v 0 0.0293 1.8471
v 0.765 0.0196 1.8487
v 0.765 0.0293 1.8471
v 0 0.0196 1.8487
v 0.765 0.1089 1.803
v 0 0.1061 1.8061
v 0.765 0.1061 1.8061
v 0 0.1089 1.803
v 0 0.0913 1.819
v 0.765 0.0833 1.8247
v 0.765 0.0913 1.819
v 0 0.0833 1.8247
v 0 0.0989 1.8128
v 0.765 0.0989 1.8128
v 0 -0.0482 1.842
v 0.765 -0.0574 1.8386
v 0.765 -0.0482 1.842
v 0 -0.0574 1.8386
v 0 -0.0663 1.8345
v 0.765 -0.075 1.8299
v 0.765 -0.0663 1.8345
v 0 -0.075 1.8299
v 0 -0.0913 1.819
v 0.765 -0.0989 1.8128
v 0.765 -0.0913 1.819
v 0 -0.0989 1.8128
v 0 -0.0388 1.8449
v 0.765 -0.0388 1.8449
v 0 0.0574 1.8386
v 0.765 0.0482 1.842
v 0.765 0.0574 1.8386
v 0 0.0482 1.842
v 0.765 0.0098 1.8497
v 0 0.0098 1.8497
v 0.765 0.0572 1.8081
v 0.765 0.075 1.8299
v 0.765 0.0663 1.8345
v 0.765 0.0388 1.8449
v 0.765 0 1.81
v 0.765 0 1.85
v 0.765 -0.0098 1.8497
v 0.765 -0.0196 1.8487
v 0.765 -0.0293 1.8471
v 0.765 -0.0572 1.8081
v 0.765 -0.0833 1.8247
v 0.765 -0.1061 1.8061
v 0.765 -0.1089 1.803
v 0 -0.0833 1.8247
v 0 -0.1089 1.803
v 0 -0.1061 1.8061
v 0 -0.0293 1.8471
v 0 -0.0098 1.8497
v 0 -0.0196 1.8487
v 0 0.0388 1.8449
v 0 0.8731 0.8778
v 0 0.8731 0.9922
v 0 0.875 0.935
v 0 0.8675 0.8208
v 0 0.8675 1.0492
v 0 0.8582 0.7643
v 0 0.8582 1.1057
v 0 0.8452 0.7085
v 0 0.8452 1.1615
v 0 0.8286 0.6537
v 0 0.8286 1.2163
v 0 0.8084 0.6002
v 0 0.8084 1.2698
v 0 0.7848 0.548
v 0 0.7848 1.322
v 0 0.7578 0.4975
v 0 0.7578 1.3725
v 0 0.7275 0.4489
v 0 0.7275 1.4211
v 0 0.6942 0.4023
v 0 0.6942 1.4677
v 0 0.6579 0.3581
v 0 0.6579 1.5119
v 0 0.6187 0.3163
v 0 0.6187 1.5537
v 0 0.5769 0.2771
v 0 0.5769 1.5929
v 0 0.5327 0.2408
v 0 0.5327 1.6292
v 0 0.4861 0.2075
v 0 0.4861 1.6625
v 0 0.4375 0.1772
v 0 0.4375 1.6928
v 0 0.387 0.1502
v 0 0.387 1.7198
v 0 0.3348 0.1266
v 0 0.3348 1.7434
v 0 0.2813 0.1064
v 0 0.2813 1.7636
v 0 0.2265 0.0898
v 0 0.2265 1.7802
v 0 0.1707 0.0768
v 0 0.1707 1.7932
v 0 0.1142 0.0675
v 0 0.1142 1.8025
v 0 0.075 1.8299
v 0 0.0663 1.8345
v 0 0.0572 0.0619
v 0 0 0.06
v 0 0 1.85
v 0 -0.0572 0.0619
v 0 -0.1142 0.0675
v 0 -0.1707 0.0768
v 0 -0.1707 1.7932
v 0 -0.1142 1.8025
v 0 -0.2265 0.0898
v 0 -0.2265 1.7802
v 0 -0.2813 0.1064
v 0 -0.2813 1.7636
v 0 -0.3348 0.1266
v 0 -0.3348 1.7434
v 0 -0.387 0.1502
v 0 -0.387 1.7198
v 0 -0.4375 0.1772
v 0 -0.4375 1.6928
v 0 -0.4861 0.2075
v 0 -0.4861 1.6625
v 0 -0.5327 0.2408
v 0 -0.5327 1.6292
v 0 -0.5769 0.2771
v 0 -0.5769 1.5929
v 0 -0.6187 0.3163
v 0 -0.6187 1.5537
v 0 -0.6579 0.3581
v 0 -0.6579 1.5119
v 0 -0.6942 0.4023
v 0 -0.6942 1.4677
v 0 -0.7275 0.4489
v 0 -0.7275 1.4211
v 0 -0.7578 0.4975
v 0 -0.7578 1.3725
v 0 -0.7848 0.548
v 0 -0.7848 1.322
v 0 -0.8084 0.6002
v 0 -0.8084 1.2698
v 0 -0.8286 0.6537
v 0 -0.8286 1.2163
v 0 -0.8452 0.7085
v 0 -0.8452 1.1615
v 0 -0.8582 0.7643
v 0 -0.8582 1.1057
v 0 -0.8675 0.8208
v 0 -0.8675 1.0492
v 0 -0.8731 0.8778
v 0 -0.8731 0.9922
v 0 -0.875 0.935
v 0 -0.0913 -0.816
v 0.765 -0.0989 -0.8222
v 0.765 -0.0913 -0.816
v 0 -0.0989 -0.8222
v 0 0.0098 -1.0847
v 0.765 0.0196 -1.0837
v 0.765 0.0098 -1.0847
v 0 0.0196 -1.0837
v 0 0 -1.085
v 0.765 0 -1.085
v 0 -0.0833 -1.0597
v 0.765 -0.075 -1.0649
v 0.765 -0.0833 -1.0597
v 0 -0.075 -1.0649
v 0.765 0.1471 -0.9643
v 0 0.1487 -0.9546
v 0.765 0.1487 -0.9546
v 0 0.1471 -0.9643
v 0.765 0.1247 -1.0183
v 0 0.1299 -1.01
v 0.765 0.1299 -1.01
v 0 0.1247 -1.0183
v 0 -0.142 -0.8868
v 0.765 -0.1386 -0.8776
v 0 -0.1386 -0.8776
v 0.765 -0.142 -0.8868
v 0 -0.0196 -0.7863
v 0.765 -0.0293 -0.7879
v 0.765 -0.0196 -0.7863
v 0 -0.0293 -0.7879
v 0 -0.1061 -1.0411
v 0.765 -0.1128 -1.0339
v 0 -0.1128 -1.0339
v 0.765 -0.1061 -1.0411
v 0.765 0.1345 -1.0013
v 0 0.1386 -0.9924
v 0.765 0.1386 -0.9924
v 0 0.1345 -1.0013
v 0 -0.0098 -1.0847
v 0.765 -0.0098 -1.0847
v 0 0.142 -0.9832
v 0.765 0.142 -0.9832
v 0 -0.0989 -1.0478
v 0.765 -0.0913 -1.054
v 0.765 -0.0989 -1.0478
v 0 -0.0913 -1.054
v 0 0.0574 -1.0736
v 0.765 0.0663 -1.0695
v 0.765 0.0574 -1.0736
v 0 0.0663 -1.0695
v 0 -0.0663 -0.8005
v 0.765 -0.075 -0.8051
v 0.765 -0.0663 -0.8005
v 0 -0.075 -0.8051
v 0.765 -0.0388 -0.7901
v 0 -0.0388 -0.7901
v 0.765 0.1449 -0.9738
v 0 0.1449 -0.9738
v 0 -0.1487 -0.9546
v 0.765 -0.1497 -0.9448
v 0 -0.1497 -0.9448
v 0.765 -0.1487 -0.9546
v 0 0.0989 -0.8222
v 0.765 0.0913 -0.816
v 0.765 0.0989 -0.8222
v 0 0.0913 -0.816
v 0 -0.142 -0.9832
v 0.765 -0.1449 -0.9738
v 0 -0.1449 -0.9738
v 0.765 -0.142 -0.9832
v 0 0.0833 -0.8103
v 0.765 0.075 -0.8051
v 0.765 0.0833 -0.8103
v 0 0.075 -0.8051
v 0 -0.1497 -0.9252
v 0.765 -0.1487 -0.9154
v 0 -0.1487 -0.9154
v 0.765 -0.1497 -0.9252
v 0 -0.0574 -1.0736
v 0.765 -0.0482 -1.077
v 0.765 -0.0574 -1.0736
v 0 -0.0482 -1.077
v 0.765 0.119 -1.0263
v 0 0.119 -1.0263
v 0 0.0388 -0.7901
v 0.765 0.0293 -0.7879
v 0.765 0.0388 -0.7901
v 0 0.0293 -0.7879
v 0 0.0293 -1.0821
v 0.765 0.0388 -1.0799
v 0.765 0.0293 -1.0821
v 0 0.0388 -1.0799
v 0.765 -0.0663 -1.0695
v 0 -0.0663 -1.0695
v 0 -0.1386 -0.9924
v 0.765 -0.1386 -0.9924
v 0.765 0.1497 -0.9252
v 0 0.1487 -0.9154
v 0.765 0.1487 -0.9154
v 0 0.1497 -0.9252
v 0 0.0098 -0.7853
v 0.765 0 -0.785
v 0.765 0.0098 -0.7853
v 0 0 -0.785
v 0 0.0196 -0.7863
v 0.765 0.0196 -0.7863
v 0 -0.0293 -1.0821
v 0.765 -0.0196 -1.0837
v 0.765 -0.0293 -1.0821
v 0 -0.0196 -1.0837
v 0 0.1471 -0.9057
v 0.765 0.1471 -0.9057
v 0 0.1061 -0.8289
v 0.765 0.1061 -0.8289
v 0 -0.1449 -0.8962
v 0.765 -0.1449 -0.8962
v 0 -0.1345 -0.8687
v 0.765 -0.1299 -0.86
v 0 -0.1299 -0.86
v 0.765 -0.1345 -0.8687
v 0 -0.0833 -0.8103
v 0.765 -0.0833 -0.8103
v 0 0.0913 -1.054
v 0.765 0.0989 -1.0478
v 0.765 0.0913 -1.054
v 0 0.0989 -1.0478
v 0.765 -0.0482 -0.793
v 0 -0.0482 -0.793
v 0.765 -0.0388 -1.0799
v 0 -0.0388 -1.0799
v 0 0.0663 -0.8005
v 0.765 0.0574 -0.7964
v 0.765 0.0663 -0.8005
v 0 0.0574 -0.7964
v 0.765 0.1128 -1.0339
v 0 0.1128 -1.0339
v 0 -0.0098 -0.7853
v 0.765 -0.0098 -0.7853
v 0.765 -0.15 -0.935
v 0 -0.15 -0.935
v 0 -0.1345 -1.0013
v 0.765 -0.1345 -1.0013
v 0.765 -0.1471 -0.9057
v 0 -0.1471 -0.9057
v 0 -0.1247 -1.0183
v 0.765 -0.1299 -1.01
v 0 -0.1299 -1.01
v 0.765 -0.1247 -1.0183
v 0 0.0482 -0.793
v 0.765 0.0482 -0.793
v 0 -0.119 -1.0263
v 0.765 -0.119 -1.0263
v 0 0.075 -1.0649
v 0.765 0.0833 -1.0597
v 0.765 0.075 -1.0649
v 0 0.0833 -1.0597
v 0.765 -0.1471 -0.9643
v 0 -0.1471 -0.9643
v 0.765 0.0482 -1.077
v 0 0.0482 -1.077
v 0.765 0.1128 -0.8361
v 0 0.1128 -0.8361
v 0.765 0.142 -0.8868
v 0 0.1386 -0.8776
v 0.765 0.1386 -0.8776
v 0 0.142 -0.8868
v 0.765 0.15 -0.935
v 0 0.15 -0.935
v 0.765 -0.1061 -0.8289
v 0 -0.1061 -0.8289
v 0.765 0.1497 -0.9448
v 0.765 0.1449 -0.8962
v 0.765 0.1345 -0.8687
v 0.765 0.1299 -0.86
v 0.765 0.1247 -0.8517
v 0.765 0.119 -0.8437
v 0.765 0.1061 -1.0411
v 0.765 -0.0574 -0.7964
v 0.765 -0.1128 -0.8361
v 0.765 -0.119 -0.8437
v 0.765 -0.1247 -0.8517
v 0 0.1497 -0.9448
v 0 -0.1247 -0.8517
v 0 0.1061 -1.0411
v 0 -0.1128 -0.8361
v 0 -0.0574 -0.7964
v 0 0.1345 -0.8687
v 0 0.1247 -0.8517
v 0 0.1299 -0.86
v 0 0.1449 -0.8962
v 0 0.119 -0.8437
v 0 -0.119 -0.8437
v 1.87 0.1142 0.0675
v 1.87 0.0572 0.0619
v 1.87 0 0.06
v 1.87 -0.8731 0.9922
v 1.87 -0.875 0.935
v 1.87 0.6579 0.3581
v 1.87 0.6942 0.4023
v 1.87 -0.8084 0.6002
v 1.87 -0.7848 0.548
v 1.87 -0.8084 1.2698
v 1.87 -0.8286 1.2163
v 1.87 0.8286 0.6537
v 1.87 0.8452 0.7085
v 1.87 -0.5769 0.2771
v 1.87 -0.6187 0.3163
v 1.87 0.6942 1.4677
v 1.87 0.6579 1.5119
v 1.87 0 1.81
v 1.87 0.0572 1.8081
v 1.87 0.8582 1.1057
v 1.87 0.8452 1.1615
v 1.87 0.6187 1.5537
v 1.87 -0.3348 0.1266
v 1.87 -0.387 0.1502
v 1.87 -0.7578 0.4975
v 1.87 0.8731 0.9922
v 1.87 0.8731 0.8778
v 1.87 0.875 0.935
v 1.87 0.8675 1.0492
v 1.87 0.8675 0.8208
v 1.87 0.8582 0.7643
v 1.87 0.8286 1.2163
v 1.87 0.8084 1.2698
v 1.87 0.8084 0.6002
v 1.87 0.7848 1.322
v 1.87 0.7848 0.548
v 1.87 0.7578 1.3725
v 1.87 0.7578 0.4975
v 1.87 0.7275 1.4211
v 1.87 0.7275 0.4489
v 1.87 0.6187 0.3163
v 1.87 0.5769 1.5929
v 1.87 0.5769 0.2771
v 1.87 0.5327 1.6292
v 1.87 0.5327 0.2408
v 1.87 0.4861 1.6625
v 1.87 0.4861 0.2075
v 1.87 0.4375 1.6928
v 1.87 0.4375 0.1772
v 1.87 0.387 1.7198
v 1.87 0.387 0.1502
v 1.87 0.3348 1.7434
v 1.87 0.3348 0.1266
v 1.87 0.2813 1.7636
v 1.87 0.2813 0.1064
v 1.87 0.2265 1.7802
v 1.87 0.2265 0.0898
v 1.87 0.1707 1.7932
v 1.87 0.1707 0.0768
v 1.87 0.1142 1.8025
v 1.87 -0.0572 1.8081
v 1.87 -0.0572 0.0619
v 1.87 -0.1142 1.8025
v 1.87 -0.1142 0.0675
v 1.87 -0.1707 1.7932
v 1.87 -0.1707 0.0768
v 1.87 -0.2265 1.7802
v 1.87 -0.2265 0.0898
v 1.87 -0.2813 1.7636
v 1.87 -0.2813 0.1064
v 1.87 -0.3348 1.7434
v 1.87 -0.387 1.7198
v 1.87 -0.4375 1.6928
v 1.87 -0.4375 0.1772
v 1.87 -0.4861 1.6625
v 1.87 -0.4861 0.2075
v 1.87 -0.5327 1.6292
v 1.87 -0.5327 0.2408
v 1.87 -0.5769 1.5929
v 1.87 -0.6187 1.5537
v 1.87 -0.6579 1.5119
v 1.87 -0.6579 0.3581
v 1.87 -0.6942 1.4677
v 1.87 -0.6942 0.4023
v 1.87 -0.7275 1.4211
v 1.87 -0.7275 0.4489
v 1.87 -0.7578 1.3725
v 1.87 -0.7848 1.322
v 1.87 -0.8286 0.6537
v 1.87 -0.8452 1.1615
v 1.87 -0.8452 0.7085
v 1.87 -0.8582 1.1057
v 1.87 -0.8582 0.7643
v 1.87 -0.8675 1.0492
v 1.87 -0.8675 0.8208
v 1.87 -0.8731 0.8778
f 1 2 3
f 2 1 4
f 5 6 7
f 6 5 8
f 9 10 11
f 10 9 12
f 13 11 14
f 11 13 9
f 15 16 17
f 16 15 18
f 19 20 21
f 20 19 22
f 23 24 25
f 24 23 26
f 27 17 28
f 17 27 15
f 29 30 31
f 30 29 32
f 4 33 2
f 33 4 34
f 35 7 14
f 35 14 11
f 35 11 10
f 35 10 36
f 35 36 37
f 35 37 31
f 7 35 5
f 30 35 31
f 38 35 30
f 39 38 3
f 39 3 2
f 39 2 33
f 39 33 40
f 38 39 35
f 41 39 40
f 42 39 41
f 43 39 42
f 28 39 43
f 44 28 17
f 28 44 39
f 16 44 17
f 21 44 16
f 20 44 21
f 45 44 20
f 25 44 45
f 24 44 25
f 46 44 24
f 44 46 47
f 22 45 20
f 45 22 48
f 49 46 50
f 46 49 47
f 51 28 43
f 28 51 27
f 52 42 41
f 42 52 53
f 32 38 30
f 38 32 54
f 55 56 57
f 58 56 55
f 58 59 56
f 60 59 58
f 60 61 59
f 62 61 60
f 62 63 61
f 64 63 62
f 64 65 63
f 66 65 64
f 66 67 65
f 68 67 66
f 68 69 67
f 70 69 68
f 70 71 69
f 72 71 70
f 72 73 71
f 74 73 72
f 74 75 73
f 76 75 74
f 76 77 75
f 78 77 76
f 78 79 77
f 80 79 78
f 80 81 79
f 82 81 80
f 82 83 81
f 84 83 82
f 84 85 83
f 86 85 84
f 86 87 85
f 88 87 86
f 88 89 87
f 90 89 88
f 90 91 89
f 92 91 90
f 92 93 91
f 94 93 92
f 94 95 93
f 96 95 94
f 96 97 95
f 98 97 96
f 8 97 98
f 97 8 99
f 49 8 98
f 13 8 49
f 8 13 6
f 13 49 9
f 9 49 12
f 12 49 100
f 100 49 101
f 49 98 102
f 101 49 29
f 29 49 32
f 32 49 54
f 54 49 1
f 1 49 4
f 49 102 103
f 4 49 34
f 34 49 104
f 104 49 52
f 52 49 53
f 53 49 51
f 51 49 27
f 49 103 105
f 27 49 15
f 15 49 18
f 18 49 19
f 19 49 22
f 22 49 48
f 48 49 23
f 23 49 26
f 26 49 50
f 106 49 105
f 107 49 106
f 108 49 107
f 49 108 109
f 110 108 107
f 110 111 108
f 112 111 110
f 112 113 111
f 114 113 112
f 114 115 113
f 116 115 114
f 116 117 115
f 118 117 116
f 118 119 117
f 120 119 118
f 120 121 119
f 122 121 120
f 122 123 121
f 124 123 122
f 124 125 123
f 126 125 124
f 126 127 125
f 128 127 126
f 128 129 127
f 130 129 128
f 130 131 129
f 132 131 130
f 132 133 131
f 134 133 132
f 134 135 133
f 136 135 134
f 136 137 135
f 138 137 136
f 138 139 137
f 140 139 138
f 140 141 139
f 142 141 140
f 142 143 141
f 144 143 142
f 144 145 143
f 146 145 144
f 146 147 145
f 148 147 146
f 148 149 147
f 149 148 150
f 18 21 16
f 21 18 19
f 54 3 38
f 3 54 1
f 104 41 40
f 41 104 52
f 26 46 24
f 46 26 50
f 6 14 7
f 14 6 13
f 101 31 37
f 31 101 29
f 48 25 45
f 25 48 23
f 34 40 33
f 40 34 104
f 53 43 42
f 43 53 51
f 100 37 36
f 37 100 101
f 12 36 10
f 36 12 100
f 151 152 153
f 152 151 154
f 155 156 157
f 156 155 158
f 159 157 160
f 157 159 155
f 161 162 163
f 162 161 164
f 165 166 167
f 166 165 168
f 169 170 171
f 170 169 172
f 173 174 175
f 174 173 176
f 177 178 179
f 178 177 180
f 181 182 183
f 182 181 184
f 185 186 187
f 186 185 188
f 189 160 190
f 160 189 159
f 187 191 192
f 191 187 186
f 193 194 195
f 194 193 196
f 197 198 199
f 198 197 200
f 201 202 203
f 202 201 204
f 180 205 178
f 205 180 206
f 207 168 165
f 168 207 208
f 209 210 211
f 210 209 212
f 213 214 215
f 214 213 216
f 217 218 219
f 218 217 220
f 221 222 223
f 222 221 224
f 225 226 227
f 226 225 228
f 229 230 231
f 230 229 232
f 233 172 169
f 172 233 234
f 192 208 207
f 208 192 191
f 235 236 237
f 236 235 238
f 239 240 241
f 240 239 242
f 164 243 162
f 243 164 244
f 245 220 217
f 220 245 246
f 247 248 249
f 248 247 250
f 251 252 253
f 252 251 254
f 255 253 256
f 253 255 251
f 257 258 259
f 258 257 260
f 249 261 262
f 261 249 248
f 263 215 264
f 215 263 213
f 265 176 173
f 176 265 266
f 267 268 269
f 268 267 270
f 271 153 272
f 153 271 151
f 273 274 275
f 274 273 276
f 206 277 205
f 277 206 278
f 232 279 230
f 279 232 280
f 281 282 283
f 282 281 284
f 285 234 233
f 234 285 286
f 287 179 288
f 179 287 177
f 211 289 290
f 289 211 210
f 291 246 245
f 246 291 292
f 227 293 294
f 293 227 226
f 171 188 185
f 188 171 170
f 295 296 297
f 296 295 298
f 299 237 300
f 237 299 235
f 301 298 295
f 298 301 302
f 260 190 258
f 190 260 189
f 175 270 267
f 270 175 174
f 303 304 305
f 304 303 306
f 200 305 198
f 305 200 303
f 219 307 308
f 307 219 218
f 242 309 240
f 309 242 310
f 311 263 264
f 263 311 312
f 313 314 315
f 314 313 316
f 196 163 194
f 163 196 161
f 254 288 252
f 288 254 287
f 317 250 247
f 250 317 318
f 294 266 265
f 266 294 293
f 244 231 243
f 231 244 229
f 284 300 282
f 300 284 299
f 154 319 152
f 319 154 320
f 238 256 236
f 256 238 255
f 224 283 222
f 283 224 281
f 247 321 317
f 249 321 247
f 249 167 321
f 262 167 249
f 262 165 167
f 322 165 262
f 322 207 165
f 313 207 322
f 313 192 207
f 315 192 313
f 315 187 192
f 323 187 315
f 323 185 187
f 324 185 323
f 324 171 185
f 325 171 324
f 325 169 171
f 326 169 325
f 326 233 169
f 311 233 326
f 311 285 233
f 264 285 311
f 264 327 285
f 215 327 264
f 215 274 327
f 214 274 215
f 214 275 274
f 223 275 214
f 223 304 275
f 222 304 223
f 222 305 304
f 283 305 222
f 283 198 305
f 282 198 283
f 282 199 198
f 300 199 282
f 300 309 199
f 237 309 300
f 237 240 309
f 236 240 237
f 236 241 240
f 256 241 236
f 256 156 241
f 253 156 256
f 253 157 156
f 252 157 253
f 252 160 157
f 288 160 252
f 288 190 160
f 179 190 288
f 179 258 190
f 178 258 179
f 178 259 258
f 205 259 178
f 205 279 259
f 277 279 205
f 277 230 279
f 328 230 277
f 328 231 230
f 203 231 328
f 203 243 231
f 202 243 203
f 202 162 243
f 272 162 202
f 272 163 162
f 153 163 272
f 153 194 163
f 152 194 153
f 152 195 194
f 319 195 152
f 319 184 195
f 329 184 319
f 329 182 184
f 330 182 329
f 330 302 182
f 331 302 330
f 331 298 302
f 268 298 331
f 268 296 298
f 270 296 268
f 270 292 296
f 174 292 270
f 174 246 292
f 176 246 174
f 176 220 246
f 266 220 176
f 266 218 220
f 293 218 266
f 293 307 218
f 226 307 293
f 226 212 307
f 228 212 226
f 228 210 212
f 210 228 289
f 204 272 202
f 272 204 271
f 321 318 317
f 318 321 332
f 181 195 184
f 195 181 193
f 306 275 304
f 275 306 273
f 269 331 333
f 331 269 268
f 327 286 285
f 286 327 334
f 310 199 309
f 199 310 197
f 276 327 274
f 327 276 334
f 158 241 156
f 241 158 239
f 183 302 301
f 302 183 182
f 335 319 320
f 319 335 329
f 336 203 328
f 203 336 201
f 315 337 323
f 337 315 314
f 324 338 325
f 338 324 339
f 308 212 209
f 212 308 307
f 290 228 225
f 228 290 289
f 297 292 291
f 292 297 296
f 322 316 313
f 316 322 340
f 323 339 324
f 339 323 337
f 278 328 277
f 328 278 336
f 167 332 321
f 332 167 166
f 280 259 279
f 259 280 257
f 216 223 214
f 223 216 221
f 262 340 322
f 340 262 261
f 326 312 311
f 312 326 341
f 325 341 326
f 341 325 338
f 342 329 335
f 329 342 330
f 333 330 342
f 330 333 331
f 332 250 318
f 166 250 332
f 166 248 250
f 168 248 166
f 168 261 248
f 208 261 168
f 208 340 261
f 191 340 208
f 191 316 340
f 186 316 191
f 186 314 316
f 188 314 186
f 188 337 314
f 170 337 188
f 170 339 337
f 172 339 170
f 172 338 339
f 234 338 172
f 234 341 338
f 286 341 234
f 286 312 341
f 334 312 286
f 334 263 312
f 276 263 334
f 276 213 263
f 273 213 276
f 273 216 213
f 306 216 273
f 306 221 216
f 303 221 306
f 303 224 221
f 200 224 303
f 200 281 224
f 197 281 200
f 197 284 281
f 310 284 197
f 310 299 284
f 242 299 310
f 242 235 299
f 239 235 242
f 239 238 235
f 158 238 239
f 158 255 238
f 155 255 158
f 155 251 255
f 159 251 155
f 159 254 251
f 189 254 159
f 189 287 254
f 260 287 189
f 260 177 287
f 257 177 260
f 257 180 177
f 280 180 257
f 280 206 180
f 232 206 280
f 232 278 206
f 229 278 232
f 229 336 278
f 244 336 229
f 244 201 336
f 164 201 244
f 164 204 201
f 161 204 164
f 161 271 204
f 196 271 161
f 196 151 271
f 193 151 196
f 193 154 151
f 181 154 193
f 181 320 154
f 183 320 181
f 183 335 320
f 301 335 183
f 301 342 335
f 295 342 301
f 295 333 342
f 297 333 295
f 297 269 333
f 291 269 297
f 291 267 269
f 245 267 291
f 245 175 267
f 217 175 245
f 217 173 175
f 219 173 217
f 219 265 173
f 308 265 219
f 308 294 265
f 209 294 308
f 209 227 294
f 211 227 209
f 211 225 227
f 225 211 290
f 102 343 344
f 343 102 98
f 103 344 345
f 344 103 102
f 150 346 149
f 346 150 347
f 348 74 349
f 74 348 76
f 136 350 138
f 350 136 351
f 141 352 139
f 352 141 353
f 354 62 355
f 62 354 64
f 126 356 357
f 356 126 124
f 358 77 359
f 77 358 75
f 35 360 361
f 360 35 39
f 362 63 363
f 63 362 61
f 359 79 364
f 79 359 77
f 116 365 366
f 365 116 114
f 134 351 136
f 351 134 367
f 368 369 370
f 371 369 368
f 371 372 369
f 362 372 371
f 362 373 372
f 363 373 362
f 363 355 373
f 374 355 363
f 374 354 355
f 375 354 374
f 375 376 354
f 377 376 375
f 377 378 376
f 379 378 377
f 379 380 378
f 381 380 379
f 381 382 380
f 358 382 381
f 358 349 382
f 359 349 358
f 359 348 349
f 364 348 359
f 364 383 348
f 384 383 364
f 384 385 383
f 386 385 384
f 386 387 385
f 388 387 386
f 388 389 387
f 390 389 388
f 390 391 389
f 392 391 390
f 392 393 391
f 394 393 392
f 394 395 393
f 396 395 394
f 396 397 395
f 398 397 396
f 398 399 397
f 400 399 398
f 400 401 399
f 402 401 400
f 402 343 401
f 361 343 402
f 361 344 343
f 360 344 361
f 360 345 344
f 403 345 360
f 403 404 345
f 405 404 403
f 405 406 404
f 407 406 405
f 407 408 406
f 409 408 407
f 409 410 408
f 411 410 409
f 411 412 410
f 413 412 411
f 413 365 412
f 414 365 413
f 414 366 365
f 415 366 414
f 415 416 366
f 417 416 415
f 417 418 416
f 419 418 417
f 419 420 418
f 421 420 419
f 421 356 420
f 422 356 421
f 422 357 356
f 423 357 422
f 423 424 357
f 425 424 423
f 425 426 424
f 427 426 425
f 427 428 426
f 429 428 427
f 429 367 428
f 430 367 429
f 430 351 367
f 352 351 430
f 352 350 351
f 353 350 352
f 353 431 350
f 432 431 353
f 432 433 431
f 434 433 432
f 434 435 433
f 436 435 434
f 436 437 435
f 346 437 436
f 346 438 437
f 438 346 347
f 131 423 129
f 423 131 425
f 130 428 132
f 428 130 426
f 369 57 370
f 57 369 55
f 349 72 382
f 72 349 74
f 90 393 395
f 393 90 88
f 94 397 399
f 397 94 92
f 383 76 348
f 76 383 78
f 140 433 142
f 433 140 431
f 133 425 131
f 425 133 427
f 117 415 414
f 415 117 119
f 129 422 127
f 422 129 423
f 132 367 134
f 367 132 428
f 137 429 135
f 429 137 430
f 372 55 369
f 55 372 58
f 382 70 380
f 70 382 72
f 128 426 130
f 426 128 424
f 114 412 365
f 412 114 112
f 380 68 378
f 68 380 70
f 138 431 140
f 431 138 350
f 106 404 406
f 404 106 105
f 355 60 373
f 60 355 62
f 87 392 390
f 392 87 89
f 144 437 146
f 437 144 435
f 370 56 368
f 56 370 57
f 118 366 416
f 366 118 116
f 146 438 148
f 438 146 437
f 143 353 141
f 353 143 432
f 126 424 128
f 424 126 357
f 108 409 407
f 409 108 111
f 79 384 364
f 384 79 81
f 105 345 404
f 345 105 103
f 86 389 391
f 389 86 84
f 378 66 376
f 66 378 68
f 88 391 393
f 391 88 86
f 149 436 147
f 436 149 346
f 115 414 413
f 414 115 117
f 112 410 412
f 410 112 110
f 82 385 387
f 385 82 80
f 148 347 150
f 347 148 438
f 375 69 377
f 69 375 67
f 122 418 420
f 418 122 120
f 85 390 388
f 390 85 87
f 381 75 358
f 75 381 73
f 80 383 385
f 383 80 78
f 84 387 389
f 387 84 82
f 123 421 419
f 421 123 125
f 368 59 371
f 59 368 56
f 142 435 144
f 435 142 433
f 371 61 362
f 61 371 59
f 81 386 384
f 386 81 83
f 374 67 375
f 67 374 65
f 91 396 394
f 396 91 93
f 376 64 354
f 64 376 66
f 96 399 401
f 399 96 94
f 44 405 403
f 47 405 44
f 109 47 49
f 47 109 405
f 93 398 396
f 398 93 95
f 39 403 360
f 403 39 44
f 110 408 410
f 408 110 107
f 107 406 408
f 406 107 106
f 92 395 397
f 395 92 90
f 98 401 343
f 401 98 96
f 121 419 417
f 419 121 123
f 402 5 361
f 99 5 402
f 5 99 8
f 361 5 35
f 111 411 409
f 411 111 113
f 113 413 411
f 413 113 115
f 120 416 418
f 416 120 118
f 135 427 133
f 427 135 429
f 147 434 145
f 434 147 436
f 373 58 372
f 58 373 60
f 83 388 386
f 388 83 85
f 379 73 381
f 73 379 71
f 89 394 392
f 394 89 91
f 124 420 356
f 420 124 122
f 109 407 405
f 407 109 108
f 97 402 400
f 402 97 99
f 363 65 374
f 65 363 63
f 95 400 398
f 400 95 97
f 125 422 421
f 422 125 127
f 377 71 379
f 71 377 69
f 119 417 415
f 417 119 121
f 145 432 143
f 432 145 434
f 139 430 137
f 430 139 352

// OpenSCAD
$fn = 96;

axial = [3.4, 1.75, 0.3]; // [length, diameter, lead_diameter]

module axial_part(a = axial) {
    L = a[0];
    D = a[1];
    d = a[2];

    bodyL = L * 0.55;
    leadL = (L - bodyL) / 2;

    union() {
        // Leads
        translate([-(bodyL/2 + leadL), 0, 0])
            cylinder(h = leadL, d = d, center = false);

        translate([bodyL/2, 0, 0])
            cylinder(h = leadL, d = d, center = false);

        // Body
        translate([-bodyL/2, 0, 0])
            cylinder(h = bodyL, d = D, center = false);
    }
}

// Orient along X axis
rotate([0, 90, 0]) axial_part();
